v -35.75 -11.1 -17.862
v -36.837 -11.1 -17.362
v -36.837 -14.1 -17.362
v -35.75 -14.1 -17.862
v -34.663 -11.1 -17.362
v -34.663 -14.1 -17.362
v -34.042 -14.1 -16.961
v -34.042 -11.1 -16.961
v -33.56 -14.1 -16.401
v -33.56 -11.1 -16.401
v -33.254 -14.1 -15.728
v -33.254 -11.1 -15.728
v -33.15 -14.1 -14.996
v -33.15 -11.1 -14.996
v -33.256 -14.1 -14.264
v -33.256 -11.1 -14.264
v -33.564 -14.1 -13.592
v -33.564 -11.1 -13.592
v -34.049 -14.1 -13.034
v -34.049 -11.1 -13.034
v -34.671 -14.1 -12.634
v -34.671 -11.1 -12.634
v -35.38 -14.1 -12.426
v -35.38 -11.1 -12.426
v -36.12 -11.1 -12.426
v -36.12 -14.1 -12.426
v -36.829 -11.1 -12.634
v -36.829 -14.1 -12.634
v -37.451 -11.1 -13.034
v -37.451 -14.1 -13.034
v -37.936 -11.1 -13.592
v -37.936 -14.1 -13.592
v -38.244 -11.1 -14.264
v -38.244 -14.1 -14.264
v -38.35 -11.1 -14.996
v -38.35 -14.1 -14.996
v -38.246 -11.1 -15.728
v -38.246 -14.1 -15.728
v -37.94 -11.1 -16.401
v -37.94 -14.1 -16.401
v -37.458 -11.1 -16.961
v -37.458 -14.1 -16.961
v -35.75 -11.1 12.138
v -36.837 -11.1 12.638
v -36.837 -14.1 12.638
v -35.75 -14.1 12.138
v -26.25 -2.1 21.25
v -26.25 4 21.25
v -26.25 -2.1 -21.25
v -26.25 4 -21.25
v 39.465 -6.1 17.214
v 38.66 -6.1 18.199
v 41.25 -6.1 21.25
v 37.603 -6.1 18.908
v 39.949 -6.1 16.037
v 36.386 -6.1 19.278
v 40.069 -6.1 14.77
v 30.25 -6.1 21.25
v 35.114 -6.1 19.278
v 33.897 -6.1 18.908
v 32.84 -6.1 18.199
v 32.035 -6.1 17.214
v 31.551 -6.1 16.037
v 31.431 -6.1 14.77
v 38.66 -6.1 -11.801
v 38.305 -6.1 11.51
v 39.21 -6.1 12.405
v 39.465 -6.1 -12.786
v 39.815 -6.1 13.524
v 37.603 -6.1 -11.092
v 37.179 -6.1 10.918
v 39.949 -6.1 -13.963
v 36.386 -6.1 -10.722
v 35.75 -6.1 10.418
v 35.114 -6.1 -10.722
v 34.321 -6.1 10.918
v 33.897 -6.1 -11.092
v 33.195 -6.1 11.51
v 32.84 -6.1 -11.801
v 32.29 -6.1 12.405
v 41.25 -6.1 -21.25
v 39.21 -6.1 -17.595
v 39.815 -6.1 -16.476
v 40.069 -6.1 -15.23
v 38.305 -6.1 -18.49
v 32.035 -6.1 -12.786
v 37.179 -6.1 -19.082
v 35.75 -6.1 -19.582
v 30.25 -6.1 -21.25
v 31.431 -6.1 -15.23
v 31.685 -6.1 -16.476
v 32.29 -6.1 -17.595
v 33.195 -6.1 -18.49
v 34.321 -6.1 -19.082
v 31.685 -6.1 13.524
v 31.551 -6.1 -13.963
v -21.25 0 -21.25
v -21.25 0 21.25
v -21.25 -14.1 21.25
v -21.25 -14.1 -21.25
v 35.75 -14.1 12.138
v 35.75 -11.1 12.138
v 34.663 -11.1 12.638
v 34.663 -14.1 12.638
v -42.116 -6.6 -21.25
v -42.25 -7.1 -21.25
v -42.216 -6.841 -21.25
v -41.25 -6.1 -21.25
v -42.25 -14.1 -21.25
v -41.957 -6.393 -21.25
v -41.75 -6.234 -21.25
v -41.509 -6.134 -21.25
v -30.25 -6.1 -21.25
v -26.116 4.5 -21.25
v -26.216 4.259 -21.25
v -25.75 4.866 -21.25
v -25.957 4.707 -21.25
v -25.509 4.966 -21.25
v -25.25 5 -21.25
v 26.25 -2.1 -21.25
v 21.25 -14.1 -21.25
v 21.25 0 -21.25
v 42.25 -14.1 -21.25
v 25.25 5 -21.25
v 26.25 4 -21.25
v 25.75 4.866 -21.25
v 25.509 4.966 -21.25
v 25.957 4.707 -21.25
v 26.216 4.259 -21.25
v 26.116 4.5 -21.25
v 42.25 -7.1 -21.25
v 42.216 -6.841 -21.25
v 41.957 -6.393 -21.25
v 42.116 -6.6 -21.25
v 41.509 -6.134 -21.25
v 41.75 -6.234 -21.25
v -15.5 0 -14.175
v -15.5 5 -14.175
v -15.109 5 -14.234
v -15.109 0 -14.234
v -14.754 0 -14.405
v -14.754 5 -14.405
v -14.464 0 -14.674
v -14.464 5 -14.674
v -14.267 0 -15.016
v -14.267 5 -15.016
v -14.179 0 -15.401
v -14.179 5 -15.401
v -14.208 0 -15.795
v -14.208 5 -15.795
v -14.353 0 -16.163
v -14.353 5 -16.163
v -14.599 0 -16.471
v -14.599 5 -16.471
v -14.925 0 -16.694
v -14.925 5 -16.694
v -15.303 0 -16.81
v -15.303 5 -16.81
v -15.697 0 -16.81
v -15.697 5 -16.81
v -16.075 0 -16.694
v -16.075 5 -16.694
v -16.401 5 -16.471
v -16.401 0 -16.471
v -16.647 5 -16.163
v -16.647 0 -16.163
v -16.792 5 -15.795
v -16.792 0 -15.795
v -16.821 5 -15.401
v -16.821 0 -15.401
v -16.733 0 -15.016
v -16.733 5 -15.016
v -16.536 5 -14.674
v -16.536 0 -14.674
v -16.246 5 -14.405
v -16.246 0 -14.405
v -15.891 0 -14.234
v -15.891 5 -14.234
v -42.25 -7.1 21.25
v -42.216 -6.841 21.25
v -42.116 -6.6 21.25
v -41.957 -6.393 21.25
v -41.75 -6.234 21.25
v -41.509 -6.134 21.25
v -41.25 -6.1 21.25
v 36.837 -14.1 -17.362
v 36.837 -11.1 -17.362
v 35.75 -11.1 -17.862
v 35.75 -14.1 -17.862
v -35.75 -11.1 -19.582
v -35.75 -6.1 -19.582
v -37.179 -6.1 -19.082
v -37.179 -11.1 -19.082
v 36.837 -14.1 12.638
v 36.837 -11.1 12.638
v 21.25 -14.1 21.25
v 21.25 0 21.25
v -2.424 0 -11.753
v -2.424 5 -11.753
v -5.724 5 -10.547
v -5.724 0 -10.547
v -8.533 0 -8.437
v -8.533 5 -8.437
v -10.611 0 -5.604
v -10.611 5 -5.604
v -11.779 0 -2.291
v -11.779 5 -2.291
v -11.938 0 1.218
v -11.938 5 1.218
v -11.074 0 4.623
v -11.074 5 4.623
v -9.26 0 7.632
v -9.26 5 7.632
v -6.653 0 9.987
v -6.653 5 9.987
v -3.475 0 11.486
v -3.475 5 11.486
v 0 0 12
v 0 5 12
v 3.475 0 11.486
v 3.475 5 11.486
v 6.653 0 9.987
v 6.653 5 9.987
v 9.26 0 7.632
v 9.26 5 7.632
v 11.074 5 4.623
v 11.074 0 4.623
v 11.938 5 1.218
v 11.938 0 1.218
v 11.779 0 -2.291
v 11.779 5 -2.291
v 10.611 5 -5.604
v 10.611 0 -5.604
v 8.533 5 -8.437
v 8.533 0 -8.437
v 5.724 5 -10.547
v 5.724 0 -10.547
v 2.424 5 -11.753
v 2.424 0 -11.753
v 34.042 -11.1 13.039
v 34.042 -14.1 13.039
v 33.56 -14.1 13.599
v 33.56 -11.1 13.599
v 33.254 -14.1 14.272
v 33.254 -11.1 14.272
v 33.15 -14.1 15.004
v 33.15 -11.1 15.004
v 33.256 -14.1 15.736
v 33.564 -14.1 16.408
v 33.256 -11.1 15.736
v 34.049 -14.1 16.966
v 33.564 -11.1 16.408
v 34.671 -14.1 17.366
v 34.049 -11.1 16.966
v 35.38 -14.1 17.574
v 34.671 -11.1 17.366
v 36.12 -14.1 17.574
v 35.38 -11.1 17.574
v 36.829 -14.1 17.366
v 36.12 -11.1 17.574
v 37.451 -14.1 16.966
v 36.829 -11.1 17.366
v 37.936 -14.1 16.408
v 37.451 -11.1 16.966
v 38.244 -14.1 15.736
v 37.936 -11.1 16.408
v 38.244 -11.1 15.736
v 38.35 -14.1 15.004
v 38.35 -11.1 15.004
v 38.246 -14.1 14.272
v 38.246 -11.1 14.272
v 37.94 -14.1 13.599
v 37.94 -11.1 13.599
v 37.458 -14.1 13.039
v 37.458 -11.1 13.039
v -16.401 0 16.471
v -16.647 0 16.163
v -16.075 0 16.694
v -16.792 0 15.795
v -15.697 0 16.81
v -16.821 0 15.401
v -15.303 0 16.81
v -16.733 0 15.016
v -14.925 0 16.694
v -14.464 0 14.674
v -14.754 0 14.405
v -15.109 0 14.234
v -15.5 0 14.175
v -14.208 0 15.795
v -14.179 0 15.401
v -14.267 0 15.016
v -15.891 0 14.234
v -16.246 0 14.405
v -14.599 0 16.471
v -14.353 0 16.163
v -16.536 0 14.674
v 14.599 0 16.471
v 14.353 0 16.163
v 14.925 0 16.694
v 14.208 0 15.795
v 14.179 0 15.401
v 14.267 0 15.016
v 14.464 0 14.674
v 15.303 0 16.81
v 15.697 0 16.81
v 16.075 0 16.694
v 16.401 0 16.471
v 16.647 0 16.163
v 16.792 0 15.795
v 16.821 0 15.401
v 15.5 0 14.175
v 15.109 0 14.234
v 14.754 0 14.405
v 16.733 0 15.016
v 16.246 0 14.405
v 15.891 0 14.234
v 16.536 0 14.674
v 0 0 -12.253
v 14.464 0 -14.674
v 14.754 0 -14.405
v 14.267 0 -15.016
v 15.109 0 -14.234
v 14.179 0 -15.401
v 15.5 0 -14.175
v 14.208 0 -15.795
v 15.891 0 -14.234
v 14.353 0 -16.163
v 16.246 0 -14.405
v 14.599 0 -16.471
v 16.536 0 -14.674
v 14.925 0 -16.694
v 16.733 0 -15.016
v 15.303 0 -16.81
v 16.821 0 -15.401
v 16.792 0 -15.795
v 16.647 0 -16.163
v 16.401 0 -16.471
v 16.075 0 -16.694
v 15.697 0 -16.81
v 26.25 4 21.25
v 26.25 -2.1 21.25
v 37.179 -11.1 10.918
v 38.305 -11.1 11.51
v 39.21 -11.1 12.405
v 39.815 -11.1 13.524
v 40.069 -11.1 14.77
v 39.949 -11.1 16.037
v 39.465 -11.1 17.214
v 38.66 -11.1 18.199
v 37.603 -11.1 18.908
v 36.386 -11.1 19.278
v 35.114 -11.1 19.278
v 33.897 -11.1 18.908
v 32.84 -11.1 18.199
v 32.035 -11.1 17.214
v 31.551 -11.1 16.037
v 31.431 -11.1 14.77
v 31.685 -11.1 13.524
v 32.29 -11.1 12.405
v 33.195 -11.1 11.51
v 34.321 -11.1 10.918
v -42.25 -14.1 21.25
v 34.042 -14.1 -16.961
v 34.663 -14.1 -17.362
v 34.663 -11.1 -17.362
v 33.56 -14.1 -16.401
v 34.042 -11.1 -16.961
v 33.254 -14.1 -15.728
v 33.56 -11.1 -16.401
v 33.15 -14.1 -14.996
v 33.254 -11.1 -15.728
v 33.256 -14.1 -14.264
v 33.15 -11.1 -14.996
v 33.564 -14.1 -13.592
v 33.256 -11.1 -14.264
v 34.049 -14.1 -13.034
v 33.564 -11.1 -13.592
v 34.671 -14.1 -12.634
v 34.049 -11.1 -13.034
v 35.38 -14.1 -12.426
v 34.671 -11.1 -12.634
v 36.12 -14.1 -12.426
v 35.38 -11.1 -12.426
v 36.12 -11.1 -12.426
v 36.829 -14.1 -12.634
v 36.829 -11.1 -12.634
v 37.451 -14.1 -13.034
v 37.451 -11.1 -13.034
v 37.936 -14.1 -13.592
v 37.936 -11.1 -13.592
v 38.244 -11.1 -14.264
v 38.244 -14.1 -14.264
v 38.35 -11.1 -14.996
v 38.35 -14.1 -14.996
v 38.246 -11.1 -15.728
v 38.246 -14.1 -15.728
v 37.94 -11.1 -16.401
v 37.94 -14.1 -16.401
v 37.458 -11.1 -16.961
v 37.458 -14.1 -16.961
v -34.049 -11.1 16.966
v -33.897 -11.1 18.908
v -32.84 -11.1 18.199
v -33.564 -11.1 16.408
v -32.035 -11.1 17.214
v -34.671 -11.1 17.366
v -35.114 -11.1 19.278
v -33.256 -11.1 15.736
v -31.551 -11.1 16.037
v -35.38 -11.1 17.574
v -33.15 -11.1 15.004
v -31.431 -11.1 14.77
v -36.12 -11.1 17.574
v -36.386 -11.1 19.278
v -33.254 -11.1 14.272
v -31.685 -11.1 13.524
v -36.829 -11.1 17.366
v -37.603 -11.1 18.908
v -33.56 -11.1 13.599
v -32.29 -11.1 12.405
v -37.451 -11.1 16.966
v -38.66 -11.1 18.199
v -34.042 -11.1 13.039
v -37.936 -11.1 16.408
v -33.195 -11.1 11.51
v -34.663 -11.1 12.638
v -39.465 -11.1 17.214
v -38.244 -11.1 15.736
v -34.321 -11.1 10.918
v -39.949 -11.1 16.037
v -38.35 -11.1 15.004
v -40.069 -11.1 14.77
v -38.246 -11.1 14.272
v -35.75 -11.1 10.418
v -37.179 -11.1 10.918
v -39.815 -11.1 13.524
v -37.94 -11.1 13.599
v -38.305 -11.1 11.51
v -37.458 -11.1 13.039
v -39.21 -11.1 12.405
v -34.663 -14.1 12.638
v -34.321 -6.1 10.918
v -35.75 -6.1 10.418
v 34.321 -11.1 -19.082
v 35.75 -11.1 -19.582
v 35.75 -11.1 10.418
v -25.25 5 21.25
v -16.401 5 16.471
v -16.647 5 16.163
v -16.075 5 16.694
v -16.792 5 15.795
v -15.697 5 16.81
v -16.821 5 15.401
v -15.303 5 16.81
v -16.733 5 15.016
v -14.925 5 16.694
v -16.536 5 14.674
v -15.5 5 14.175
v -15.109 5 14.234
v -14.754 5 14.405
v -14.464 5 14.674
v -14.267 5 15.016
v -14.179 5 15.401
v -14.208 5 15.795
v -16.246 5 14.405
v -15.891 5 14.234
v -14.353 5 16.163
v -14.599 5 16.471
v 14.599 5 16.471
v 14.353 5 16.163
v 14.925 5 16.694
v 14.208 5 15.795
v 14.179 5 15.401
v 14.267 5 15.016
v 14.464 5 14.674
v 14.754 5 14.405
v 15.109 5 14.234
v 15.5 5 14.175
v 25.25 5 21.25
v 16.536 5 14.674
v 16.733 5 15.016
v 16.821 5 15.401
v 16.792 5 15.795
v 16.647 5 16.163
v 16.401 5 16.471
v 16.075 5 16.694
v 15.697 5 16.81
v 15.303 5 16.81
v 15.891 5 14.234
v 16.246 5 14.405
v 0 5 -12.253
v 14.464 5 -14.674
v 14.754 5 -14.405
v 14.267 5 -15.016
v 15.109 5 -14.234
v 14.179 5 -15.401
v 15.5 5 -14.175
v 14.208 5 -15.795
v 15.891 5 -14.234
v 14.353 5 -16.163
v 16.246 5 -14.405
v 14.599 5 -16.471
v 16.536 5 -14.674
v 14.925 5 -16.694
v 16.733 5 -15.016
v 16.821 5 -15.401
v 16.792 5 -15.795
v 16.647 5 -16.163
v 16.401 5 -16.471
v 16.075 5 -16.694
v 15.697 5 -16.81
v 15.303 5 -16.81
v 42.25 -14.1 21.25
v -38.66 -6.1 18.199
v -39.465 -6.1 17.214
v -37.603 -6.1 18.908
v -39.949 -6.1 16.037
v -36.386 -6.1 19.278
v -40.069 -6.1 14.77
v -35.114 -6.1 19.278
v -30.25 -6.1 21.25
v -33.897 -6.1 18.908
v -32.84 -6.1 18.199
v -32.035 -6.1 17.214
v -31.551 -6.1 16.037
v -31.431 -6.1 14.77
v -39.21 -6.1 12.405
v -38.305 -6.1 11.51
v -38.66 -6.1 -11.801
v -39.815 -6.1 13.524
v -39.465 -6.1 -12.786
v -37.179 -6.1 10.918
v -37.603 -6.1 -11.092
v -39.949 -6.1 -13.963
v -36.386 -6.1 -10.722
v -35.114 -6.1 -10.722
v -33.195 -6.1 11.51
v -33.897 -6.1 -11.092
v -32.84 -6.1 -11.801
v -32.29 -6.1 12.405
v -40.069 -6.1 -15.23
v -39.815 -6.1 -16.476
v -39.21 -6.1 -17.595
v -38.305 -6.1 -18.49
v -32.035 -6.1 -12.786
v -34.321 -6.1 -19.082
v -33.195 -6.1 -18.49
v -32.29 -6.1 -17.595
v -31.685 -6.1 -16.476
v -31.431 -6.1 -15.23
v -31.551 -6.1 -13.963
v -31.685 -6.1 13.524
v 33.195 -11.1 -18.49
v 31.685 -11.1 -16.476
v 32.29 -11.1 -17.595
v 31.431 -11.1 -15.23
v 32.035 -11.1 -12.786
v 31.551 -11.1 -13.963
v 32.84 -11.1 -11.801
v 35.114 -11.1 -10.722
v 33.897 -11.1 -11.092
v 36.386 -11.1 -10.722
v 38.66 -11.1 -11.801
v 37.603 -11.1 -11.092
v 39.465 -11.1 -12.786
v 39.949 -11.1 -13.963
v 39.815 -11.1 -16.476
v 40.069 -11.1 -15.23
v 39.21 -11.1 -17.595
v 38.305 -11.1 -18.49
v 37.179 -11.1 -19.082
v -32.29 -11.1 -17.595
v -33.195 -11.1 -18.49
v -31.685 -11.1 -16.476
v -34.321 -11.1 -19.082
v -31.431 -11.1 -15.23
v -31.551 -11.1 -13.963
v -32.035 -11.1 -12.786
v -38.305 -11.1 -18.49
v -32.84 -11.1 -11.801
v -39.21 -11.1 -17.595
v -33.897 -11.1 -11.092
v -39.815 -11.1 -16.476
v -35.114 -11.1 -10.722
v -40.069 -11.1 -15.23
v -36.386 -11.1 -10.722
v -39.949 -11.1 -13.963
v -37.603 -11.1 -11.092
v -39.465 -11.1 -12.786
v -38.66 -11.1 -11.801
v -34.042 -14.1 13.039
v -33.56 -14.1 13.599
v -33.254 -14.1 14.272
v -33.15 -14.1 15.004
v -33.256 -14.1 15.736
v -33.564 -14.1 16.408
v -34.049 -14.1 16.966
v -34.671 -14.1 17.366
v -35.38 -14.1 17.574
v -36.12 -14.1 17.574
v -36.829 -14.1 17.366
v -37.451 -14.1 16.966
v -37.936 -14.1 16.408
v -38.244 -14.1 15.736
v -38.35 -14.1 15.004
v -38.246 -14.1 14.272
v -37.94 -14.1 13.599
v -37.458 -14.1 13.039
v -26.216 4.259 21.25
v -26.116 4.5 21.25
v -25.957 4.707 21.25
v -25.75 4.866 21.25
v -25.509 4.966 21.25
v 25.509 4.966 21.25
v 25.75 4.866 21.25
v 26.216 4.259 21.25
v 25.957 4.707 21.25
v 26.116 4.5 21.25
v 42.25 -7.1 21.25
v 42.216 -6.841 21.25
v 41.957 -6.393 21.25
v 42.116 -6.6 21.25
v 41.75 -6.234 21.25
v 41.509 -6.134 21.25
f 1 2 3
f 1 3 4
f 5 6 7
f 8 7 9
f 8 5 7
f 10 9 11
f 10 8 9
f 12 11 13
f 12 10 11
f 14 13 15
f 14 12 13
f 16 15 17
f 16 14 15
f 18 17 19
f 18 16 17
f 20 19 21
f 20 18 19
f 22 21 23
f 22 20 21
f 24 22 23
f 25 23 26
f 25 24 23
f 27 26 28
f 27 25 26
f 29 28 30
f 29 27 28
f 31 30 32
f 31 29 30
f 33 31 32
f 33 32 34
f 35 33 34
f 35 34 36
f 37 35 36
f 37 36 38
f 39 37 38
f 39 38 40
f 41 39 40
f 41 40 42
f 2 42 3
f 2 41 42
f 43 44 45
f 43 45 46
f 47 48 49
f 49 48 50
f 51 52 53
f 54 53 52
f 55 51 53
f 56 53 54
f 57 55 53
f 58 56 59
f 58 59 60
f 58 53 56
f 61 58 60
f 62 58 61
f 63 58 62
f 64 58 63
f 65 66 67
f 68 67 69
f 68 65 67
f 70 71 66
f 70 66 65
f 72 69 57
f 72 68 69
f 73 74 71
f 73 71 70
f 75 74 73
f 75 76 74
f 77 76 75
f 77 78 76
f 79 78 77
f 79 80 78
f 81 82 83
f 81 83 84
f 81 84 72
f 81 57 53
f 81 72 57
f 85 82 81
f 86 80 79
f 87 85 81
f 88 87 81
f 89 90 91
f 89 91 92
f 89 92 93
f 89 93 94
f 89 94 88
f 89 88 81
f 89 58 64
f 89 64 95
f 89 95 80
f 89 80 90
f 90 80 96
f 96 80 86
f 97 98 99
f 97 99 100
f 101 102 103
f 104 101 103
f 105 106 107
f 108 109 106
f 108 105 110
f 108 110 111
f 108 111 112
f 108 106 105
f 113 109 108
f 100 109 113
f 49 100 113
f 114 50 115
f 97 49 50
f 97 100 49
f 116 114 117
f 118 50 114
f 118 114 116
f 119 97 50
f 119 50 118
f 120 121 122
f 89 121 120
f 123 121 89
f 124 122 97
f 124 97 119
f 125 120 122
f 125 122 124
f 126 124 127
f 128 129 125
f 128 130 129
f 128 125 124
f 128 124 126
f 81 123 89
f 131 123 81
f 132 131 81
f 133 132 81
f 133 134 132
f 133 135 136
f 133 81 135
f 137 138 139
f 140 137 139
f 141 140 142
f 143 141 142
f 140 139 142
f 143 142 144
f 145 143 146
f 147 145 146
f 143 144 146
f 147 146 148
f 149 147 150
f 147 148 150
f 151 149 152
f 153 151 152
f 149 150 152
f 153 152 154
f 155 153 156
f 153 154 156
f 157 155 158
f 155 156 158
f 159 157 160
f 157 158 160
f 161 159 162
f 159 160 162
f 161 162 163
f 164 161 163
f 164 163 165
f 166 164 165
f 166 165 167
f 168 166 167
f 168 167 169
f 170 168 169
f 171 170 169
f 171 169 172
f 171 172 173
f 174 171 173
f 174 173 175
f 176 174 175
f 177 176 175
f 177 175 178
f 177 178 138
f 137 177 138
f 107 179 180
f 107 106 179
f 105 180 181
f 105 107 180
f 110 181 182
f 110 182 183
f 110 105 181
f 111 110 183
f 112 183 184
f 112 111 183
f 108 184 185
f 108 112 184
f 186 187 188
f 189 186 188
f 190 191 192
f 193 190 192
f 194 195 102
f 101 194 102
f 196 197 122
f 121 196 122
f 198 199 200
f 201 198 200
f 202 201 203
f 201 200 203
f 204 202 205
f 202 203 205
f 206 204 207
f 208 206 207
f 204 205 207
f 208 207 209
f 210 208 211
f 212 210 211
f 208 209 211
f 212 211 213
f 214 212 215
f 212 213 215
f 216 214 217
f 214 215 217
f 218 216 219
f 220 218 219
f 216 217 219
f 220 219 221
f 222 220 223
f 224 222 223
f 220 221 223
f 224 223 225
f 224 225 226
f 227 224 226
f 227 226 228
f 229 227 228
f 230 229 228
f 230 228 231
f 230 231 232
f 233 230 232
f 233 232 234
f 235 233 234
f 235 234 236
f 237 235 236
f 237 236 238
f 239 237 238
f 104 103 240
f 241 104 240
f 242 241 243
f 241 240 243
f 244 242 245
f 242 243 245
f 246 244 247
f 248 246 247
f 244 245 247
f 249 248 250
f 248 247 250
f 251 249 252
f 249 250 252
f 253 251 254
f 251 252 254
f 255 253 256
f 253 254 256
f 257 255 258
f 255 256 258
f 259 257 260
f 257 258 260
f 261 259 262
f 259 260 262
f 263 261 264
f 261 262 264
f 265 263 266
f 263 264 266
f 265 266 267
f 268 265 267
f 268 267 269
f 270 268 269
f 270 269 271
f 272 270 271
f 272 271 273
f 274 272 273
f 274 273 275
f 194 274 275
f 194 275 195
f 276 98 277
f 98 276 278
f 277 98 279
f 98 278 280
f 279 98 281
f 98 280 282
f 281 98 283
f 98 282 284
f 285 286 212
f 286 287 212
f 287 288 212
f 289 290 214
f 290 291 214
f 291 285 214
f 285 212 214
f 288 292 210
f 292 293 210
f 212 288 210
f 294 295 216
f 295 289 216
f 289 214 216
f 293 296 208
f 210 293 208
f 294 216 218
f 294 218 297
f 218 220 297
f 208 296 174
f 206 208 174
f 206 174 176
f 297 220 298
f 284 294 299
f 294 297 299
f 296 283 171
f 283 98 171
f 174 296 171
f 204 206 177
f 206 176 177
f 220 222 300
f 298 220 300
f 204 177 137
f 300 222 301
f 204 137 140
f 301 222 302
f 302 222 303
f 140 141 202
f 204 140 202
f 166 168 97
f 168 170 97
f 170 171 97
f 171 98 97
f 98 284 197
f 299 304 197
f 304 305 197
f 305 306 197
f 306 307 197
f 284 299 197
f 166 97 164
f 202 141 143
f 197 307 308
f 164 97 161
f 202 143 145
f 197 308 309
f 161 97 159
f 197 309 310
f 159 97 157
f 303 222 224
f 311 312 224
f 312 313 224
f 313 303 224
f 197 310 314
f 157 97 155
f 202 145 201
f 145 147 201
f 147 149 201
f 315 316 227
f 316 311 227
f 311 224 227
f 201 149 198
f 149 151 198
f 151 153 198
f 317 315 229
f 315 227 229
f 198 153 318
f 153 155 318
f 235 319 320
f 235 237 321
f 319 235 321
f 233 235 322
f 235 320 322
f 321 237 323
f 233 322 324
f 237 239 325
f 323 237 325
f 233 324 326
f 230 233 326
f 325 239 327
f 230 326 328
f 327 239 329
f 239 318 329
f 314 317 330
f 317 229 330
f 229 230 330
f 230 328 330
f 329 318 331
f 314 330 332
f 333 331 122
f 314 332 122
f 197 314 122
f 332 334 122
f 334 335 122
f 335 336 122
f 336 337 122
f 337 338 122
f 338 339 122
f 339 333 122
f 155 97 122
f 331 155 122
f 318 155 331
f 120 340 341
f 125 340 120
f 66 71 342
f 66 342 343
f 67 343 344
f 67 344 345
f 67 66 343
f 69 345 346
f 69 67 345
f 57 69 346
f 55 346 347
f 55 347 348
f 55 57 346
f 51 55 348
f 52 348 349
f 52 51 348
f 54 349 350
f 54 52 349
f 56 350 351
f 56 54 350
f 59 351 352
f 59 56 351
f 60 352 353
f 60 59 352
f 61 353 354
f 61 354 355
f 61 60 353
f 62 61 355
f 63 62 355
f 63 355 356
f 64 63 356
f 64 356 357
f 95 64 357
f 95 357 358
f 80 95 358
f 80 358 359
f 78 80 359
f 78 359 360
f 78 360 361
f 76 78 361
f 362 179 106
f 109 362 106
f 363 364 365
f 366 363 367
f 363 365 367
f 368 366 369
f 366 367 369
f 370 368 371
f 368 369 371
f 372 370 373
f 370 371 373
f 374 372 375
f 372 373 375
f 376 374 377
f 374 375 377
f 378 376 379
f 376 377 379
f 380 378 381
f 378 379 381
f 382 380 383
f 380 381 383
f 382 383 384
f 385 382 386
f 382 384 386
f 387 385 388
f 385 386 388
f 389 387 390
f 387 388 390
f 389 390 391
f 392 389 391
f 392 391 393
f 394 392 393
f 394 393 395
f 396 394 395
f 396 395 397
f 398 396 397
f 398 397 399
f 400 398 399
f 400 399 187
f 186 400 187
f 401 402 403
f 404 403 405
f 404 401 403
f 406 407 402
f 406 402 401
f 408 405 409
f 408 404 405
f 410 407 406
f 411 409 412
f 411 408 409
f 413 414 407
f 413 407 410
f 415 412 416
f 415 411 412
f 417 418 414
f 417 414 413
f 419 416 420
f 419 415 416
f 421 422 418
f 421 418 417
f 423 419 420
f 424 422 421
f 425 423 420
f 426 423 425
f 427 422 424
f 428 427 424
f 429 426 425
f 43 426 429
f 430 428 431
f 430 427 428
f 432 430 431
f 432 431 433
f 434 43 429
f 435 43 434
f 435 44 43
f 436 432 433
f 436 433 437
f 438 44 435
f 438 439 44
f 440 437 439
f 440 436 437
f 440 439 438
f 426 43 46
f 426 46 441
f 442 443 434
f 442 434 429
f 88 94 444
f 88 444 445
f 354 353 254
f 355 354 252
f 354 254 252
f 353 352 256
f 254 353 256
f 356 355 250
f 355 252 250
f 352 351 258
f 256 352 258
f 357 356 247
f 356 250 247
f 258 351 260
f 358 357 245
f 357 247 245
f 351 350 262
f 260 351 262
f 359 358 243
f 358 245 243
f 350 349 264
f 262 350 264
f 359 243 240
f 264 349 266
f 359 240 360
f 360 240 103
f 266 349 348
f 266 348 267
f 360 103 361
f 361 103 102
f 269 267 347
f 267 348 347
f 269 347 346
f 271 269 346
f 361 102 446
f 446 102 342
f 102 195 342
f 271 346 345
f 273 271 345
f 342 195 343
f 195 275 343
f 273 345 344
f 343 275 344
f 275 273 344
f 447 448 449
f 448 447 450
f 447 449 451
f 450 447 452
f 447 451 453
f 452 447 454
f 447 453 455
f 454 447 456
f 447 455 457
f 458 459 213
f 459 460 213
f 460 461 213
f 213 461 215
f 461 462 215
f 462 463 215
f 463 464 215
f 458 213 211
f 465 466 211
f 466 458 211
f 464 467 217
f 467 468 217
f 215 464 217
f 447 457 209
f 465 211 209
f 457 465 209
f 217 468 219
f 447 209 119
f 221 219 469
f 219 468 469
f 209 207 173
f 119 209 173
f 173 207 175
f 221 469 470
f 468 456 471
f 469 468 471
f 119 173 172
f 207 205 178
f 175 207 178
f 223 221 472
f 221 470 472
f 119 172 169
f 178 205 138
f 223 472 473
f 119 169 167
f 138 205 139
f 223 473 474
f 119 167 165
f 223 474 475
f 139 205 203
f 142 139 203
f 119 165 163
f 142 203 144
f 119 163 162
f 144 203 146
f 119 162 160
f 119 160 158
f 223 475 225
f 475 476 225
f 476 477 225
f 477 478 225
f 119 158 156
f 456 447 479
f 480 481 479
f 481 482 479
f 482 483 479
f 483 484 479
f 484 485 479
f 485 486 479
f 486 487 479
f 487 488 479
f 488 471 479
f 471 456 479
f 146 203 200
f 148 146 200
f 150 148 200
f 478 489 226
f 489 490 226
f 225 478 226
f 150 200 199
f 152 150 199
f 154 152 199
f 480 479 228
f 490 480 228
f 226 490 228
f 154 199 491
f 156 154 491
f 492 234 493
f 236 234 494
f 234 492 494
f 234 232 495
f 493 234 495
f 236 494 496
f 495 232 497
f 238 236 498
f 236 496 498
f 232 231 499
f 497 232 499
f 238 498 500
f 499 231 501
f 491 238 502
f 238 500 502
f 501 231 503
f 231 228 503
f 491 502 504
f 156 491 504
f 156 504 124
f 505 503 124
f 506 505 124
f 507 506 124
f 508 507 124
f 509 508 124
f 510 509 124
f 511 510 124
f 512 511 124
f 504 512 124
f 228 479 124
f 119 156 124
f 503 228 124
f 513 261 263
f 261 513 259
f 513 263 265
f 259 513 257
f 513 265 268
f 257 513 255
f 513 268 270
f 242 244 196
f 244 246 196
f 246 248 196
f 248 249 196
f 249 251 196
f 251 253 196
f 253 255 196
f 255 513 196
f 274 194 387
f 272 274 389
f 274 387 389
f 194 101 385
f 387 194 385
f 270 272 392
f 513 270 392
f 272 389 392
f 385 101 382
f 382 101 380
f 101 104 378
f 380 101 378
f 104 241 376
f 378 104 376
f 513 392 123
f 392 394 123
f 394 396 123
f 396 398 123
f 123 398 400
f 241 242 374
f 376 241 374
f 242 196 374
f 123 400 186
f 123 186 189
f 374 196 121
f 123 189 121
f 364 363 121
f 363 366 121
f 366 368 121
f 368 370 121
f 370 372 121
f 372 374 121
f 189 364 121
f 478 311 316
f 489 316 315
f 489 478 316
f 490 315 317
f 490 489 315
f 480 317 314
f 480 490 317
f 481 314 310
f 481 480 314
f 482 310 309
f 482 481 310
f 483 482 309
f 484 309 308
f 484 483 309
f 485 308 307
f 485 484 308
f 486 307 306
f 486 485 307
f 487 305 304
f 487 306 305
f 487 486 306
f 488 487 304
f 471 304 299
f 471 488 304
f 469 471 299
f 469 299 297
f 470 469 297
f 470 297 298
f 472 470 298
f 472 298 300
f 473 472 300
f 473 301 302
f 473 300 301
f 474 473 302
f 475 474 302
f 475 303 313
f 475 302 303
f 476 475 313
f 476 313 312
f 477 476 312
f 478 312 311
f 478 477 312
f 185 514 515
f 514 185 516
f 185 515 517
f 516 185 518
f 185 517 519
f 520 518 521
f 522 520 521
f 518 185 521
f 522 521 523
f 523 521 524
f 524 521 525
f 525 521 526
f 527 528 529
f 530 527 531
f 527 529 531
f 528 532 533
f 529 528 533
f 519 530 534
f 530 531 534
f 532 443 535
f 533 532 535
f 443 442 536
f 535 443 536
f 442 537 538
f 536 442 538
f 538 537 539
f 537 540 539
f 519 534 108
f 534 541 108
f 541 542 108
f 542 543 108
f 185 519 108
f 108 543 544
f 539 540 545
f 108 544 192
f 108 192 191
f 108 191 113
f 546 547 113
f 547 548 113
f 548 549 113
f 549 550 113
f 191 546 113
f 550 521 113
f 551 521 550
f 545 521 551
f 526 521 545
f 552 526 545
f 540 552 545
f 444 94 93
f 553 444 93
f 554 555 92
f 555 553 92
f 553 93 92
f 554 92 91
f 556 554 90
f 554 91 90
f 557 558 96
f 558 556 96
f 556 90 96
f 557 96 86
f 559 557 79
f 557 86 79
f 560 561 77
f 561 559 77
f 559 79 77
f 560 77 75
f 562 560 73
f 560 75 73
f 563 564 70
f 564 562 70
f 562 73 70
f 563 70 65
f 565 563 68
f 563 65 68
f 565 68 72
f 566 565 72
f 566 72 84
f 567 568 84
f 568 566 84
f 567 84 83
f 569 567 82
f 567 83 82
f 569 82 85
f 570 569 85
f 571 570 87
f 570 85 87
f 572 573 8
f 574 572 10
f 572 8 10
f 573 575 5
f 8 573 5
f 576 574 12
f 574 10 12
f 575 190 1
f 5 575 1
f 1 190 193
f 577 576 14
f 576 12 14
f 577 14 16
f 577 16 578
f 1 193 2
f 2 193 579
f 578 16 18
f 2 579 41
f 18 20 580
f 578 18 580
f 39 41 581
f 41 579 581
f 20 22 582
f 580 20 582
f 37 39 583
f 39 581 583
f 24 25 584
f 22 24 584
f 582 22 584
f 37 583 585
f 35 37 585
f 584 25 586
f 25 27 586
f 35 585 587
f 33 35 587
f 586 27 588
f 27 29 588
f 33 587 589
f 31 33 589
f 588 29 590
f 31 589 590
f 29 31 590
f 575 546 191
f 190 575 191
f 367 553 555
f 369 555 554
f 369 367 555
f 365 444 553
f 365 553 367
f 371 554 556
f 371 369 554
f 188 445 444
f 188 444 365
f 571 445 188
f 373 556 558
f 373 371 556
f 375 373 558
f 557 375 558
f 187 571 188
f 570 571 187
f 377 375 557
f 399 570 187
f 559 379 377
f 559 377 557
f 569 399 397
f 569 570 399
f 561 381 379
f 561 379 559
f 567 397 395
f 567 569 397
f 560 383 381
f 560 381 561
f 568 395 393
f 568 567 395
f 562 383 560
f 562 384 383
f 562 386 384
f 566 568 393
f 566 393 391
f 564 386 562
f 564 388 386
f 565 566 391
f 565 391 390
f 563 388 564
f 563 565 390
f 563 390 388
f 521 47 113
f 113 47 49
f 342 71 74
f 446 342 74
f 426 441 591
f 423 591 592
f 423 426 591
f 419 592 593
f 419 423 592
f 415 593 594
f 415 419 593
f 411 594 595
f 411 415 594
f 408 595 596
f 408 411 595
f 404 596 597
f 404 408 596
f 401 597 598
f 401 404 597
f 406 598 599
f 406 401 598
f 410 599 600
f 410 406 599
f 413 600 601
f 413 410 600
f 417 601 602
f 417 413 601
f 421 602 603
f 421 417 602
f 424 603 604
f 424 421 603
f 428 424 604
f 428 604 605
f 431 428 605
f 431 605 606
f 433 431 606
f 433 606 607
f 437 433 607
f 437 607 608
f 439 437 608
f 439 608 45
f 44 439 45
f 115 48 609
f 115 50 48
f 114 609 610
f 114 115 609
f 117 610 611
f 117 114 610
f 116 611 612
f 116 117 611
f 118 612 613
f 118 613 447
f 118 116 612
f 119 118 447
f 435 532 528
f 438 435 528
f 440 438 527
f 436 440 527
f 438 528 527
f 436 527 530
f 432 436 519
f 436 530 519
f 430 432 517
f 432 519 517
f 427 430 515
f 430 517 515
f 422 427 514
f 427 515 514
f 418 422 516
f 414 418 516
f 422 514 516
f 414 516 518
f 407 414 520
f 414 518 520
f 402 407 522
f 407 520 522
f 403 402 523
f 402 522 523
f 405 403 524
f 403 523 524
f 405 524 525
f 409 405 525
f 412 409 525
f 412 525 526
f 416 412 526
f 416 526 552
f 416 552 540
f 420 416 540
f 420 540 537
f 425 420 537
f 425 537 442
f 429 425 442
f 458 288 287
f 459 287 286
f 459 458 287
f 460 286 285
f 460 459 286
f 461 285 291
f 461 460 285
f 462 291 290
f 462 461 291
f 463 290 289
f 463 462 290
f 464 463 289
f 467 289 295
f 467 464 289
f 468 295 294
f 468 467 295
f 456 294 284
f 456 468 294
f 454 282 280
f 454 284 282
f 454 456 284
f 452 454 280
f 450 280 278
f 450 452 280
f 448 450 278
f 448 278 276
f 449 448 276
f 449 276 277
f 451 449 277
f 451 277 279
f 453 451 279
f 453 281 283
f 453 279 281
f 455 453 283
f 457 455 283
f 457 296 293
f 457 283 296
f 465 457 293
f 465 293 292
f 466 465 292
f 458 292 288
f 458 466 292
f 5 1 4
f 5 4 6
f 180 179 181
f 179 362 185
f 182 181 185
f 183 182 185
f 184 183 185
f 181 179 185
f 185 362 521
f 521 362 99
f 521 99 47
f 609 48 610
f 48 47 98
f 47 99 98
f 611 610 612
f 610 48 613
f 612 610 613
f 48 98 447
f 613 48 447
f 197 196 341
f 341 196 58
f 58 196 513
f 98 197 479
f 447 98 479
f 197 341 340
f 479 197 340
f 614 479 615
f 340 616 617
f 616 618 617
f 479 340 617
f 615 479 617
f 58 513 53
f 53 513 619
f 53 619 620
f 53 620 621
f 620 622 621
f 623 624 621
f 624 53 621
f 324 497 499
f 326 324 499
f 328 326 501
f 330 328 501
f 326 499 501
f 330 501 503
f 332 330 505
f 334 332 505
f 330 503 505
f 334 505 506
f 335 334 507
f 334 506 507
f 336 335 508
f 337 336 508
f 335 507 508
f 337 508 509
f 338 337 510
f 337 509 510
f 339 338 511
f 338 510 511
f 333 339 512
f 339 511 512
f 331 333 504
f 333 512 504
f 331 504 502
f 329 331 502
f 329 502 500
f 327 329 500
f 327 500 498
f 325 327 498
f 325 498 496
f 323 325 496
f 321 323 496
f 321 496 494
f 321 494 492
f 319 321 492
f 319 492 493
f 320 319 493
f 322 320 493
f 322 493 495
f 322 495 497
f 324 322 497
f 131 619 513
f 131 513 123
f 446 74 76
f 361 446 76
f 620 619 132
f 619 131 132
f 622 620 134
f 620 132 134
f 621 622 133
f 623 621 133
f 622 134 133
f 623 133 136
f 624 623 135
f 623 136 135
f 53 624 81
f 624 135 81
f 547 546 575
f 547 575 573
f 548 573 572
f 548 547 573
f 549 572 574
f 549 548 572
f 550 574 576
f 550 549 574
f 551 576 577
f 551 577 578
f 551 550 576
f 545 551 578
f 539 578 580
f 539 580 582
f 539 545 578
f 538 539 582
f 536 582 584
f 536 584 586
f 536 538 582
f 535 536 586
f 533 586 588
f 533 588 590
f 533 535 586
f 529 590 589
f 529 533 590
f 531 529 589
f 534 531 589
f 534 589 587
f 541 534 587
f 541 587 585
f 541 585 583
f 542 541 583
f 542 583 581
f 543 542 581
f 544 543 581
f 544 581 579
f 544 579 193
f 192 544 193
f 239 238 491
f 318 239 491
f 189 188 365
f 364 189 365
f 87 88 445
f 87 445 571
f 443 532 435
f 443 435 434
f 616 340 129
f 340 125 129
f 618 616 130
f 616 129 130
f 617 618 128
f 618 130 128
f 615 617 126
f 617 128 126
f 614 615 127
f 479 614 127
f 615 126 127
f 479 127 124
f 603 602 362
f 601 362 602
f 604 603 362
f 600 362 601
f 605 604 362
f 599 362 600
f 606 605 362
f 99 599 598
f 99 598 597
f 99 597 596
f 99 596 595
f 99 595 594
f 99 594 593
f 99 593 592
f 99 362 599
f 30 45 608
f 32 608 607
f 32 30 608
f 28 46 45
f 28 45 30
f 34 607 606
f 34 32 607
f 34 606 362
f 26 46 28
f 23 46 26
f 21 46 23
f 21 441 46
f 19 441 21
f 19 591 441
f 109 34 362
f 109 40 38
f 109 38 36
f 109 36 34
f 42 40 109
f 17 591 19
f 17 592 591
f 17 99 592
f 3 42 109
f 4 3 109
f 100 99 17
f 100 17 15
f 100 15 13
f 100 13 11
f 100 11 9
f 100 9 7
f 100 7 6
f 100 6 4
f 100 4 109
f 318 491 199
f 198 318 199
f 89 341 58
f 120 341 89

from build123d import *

# Parameters (mm, degrees)
ESQUISSE1_W                  = 42.5
ESQUISSE1_H                  = 42.5
BOSS_EXTRU_1_DEPTH           = 5
ESQUISSE2_R                  = 1.325
ENL_V_MAT_EXTRU_1_DEPTH      = 31.465144017
ENL_V_MAT_EXTRU_2_DEPTH      = 31.465144017
ESQUISSE4_W                  = 42.5
ESQUISSE4_H                  = 19.1
BOSS_EXTRU_2_DEPTH           = 5
ESQUISSE5_W                  = 42.5
ESQUISSE5_H                  = 8
BOSS_EXTRU_3_DEPTH           = 16
ESQUISSE7_R                  = 2.6
ENL_V_MAT_EXTRU_3_DEPTH      = 49.578132941
CONG_2_R                     = 1
CHANFREIN1_SIZE              = 4
CONG_2_OF_SYM_TRIE3_R        = 1
CHANFREIN1_OF_SYM_TRIE3_SIZE = 4
ESQUISSE11_R                 = 4.325
ENL_V_MAT_EXTRU_4_DEPTH      = 5
ENL_V_MAT_EXTRU_5_DEPTH      = 5
ENL_V_MAT_EXTRU_6_DEPTH      = 50.958332638
ENL_V_MAT_EXTRU_7_DEPTH      = 50.958332638
ENL_V_MAT_EXTRU_8_DEPTH      = 5
SYM_TRIE5_COPY_1_SKETCH_R    = 4.325
SYM_TRIE5_COPY_1_DEPTH       = 5


with BuildPart() as part:
    # Esquisse1 → Boss.-Extru.1 (new body)
    with BuildSketch(Plane(origin=(0, 0, 0), x_dir=(1, 0, 0), z_dir=(0, 1, 0))):
        Rectangle(ESQUISSE1_W, ESQUISSE1_H)
    extrude(amount=BOSS_EXTRU_1_DEPTH)

    # Esquisse2 → Enlèv. mat.-Extru.1 (cut, through all)
    with BuildSketch(Plane(origin=(0, 5, 0), x_dir=(1, 0, 0), z_dir=(0, 1, 0))):
        with Locations(Location((-15.5, 15.5, 0), (0, 0, 270))):
            Circle(ESQUISSE2_R)
        with Locations(Location((15.5, 15.5, 0), (0, 0, 270))):
            Circle(ESQUISSE2_R)
    enl_v_mat_extru_1 = extrude(amount=-ENL_V_MAT_EXTRU_1_DEPTH, mode=Mode.SUBTRACT)

    # Symétrie1: Enlèv. mat.-Extru.1 across plane
    add(enl_v_mat_extru_1.mirror(Plane.XY), mode=Mode.SUBTRACT)

    # Esquisse3 → Enlèv. mat.-Extru.2 (cut, through all)
    with BuildSketch(Plane(origin=(0, 5, 0), x_dir=(1, 0, 0), z_dir=(0, 1, 0))):
        with BuildLine():
            Line((2.424108484, 11.752603884), (0, 12.252603884))
            Line((0, 12.252603884), (-2.424108484, 11.752603884))
            ThreePointArc((-2.424108484, 11.752603884), (0, -12), (2.424108484, 11.752603884))
        make_face()
    extrude(amount=-ENL_V_MAT_EXTRU_2_DEPTH, mode=Mode.SUBTRACT)

    # Esquisse4 → Boss.-Extru.2 (add)
    with BuildSketch(Plane(origin=(21.25, 0, 0), x_dir=(0, 0, -1), z_dir=(1, 0, 0))):
        with Locations((0, -4.55)):
            Rectangle(ESQUISSE4_W, ESQUISSE4_H)
    boss_extru_2 = extrude(amount=BOSS_EXTRU_2_DEPTH)

    # Esquisse5 → Boss.-Extru.3 (add)
    with BuildSketch(Plane(origin=(26.25, 0, 0), x_dir=(0, 0, -1), z_dir=(1, 0, 0))):
        with Locations((0, -10.1)):
            Rectangle(ESQUISSE5_W, ESQUISSE5_H)
    boss_extru_3 = extrude(amount=BOSS_EXTRU_3_DEPTH)

    # Esquisse7 → Enlèv. mat.-Extru.3 (cut, through all)
    with BuildSketch(Plane(origin=(0, -6.1, 0), x_dir=(1, 0, 0), z_dir=(0, 1, 0))):
        with Locations(Location((35.75, 15, 0), (0, 0, 270))):
            Circle(ESQUISSE7_R)
        with Locations(Location((35.75, -15, 0), (0, 0, 270))):
            Circle(ESQUISSE7_R)
    enl_v_mat_extru_3 = extrude(amount=-ENL_V_MAT_EXTRU_3_DEPTH, mode=Mode.SUBTRACT)

    # Congé2
    cong_2_edges = [part.edges().sort_by_distance(p)[0] for p in [
        (26.25, 5, 0),
        (42.25, -6.1, 0),
    ]]
    fillet(cong_2_edges, radius=CONG_2_R)

    # Chanfrein1
    chanfrein1_edges = [part.edges().sort_by_distance(p)[0] for p in [
        (26.25, -6.1, 0),
    ]]
    chamfer(chanfrein1_edges, length=CHANFREIN1_SIZE)

    # Symétrie3: Boss.-Extru.2, Boss.-Extru.3, Enlèv. mat.-Extru.3 across plane
    add(boss_extru_2.mirror(Plane(origin=(0, 0, 0), x_dir=(0, 0, 1), z_dir=(1, 0, 0))))
    add(boss_extru_3.mirror(Plane(origin=(0, 0, 0), x_dir=(0, 0, 1), z_dir=(1, 0, 0))))
    add(enl_v_mat_extru_3.mirror(Plane(origin=(0, 0, 0), x_dir=(0, 0, 1), z_dir=(1, 0, 0))), mode=Mode.SUBTRACT)

    # Congé2 of Symétrie3
    cong_2_of_sym_trie3_edges = [part.edges().sort_by_distance(p)[0] for p in [
        (-26.25, 5, 0),
        (-42.25, -6.1, 0),
    ]]
    fillet(cong_2_of_sym_trie3_edges, radius=CONG_2_OF_SYM_TRIE3_R)

    # Chanfrein1 of Symétrie3
    chanfrein1_of_sym_trie3_edges = [part.edges().sort_by_distance(p)[0] for p in [
        (-26.25, -6.1, 0),
    ]]
    chamfer(chanfrein1_of_sym_trie3_edges, length=CHANFREIN1_OF_SYM_TRIE3_SIZE)

    # Esquisse11 → Enlèv. mat.-Extru.4 (cut)
    with BuildSketch(Plane(origin=(0, -6.1, 0), x_dir=(1, 0, 0), z_dir=(0, 1, 0))):
        with Locations(Location((35.75, 15, 0), (0, 0, 270))):
            Circle(ESQUISSE11_R)
    enl_v_mat_extru_4 = extrude(amount=-ENL_V_MAT_EXTRU_4_DEPTH, mode=Mode.SUBTRACT)

    # Symétrie4: Enlèv. mat.-Extru.4 across plane
    add(enl_v_mat_extru_4.mirror(Plane.XY), mode=Mode.SUBTRACT)

    # Esquisse12 → Enlèv. mat.-Extru.5 (cut)
    with BuildSketch(Plane(origin=(0, -6.1, 0), x_dir=(1, 0, 0), z_dir=(0, 1, 0))):
        Polygon((37.178674107, 19.082219408), (34.321325893, 19.082219408), (35.75, 19.582219408), align=None)
    enl_v_mat_extru_5 = extrude(amount=-ENL_V_MAT_EXTRU_5_DEPTH, mode=Mode.SUBTRACT)

    # Esquisse13 → Enlèv. mat.-Extru.6 (cut, through all)
    with BuildSketch(Plane(origin=(0, -11.1, 0), x_dir=(1, 0, 0), z_dir=(0, 1, 0))):
        Polygon((34.663263699, 17.361991577), (36.836736301, 17.361991577), (35.75, 17.861991577), align=None)
    enl_v_mat_extru_6 = extrude(amount=-ENL_V_MAT_EXTRU_6_DEPTH, mode=Mode.SUBTRACT)

    # Esquisse14 → Enlèv. mat.-Extru.7 (cut, through all)
    with BuildSketch(Plane(origin=(0, -11.1, 0), x_dir=(1, 0, 0), z_dir=(0, 1, 0))):
        Polygon((36.836736301, -12.638008423), (35.75, -12.138008423), (34.663263699, -12.638008423), align=None)
    enl_v_mat_extru_7 = extrude(amount=-ENL_V_MAT_EXTRU_7_DEPTH, mode=Mode.SUBTRACT)

    # Esquisse15 → Enlèv. mat.-Extru.8 (cut)
    with BuildSketch(Plane(origin=(0, -6.1, 0), x_dir=(1, 0, 0), z_dir=(0, 1, 0))):
        Polygon((34.321325893, -10.917780592), (37.178674107, -10.917780592), (35.75, -10.417780592), align=None)
    enl_v_mat_extru_8 = extrude(amount=-ENL_V_MAT_EXTRU_8_DEPTH, mode=Mode.SUBTRACT)

    # Symétrie5: Enlèv. mat.-Extru.4, Enlèv. mat.-Extru.5, Enlèv. mat.-Extru.6, Enlèv. mat.-Extru.7, Enlèv. mat.-Extru.8 across plane
    add(enl_v_mat_extru_4.mirror(Plane(origin=(0, 0, 0), x_dir=(0, 0, 1), z_dir=(1, 0, 0))), mode=Mode.SUBTRACT)
    add(enl_v_mat_extru_5.mirror(Plane(origin=(0, 0, 0), x_dir=(0, 0, 1), z_dir=(1, 0, 0))), mode=Mode.SUBTRACT)
    add(enl_v_mat_extru_6.mirror(Plane(origin=(0, 0, 0), x_dir=(0, 0, 1), z_dir=(1, 0, 0))), mode=Mode.SUBTRACT)
    add(enl_v_mat_extru_7.mirror(Plane(origin=(0, 0, 0), x_dir=(0, 0, 1), z_dir=(1, 0, 0))), mode=Mode.SUBTRACT)
    add(enl_v_mat_extru_8.mirror(Plane(origin=(0, 0, 0), x_dir=(0, 0, 1), z_dir=(1, 0, 0))), mode=Mode.SUBTRACT)

    # Symétrie5 copy 1 sketch → Symétrie5 copy 1 (cut)
    with BuildSketch(Plane(origin=(0, -6.1, 0), x_dir=(-1, 0, 0), z_dir=(0, 1, 0))):
        with Locations(Location((35.75, 15, 0), (0, 0, 270))):
            Circle(SYM_TRIE5_COPY_1_SKETCH_R)
    extrude(amount=-SYM_TRIE5_COPY_1_DEPTH, mode=Mode.SUBTRACT)


solid = part.part
